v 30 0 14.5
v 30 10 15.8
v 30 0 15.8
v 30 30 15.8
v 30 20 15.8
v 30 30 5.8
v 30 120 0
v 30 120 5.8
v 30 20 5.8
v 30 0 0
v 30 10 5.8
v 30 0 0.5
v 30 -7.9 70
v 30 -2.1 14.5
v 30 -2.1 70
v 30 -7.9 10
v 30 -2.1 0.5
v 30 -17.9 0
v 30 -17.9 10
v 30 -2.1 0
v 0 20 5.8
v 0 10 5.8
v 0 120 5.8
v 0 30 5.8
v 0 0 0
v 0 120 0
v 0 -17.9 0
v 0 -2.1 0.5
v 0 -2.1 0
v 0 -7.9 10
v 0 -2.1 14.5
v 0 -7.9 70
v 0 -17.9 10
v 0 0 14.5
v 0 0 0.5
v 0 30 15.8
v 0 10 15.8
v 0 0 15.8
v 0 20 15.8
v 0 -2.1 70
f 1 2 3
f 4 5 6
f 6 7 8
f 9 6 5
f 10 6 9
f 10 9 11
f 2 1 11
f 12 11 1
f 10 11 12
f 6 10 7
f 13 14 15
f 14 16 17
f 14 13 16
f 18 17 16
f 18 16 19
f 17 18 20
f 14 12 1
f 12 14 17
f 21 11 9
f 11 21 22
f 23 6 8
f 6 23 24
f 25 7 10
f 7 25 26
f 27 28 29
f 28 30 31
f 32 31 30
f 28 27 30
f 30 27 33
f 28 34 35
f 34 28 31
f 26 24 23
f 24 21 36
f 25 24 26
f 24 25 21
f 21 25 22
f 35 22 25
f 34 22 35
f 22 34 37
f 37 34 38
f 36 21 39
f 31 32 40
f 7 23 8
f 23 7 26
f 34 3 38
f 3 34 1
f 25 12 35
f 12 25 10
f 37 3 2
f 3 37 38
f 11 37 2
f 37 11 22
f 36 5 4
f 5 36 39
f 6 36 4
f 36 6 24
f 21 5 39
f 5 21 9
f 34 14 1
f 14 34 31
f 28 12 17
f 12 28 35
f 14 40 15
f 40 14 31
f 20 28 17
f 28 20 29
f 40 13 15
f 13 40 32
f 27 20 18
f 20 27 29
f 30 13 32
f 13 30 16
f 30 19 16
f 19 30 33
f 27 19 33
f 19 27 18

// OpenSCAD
// 2026-11-03: side section through a door bottom hook (looking along x): shell bottom
// panel, bottom 1010 frame member, foam, door and its outside 1010 frame, hook, floor rail.
t = 5.8; ext = 10; foam = 2.1;
w = 30;   // section slab along x
color([0.80, 0.88, 1.0]) translate([0, 0, 0]) cube([w, 120, t]);                       // shell bottom panel
color([0.75, 0.76, 0.78]) translate([0, 0, t]) cube([w, ext, ext]);                     // bottom frame member
color([0.75, 0.76, 0.78]) translate([0, 20, t]) cube([w, ext, ext]);                    // floor rail
color([0.25, 0.25, 0.25]) translate([0, -foam, 0.5]) cube([w, foam, 14]);              // foam
color([0.85, 0.92, 1.0]) translate([0, -foam - t, 0]) cube([w, t, 70]);                // door acrylic
color([0.75, 0.76, 0.78]) translate([0, -foam - t - ext, 0]) cube([w, ext, ext]);      // door frame, bottom
// 2026-11-11: stl/2026-11-03_door_hook.stl (superseded hook) removed from stl/; it is in git history (e8c96ab).
// color([0.2, 0.2, 0.22]) import("../stl/2026-11-03_door_hook.stl");
